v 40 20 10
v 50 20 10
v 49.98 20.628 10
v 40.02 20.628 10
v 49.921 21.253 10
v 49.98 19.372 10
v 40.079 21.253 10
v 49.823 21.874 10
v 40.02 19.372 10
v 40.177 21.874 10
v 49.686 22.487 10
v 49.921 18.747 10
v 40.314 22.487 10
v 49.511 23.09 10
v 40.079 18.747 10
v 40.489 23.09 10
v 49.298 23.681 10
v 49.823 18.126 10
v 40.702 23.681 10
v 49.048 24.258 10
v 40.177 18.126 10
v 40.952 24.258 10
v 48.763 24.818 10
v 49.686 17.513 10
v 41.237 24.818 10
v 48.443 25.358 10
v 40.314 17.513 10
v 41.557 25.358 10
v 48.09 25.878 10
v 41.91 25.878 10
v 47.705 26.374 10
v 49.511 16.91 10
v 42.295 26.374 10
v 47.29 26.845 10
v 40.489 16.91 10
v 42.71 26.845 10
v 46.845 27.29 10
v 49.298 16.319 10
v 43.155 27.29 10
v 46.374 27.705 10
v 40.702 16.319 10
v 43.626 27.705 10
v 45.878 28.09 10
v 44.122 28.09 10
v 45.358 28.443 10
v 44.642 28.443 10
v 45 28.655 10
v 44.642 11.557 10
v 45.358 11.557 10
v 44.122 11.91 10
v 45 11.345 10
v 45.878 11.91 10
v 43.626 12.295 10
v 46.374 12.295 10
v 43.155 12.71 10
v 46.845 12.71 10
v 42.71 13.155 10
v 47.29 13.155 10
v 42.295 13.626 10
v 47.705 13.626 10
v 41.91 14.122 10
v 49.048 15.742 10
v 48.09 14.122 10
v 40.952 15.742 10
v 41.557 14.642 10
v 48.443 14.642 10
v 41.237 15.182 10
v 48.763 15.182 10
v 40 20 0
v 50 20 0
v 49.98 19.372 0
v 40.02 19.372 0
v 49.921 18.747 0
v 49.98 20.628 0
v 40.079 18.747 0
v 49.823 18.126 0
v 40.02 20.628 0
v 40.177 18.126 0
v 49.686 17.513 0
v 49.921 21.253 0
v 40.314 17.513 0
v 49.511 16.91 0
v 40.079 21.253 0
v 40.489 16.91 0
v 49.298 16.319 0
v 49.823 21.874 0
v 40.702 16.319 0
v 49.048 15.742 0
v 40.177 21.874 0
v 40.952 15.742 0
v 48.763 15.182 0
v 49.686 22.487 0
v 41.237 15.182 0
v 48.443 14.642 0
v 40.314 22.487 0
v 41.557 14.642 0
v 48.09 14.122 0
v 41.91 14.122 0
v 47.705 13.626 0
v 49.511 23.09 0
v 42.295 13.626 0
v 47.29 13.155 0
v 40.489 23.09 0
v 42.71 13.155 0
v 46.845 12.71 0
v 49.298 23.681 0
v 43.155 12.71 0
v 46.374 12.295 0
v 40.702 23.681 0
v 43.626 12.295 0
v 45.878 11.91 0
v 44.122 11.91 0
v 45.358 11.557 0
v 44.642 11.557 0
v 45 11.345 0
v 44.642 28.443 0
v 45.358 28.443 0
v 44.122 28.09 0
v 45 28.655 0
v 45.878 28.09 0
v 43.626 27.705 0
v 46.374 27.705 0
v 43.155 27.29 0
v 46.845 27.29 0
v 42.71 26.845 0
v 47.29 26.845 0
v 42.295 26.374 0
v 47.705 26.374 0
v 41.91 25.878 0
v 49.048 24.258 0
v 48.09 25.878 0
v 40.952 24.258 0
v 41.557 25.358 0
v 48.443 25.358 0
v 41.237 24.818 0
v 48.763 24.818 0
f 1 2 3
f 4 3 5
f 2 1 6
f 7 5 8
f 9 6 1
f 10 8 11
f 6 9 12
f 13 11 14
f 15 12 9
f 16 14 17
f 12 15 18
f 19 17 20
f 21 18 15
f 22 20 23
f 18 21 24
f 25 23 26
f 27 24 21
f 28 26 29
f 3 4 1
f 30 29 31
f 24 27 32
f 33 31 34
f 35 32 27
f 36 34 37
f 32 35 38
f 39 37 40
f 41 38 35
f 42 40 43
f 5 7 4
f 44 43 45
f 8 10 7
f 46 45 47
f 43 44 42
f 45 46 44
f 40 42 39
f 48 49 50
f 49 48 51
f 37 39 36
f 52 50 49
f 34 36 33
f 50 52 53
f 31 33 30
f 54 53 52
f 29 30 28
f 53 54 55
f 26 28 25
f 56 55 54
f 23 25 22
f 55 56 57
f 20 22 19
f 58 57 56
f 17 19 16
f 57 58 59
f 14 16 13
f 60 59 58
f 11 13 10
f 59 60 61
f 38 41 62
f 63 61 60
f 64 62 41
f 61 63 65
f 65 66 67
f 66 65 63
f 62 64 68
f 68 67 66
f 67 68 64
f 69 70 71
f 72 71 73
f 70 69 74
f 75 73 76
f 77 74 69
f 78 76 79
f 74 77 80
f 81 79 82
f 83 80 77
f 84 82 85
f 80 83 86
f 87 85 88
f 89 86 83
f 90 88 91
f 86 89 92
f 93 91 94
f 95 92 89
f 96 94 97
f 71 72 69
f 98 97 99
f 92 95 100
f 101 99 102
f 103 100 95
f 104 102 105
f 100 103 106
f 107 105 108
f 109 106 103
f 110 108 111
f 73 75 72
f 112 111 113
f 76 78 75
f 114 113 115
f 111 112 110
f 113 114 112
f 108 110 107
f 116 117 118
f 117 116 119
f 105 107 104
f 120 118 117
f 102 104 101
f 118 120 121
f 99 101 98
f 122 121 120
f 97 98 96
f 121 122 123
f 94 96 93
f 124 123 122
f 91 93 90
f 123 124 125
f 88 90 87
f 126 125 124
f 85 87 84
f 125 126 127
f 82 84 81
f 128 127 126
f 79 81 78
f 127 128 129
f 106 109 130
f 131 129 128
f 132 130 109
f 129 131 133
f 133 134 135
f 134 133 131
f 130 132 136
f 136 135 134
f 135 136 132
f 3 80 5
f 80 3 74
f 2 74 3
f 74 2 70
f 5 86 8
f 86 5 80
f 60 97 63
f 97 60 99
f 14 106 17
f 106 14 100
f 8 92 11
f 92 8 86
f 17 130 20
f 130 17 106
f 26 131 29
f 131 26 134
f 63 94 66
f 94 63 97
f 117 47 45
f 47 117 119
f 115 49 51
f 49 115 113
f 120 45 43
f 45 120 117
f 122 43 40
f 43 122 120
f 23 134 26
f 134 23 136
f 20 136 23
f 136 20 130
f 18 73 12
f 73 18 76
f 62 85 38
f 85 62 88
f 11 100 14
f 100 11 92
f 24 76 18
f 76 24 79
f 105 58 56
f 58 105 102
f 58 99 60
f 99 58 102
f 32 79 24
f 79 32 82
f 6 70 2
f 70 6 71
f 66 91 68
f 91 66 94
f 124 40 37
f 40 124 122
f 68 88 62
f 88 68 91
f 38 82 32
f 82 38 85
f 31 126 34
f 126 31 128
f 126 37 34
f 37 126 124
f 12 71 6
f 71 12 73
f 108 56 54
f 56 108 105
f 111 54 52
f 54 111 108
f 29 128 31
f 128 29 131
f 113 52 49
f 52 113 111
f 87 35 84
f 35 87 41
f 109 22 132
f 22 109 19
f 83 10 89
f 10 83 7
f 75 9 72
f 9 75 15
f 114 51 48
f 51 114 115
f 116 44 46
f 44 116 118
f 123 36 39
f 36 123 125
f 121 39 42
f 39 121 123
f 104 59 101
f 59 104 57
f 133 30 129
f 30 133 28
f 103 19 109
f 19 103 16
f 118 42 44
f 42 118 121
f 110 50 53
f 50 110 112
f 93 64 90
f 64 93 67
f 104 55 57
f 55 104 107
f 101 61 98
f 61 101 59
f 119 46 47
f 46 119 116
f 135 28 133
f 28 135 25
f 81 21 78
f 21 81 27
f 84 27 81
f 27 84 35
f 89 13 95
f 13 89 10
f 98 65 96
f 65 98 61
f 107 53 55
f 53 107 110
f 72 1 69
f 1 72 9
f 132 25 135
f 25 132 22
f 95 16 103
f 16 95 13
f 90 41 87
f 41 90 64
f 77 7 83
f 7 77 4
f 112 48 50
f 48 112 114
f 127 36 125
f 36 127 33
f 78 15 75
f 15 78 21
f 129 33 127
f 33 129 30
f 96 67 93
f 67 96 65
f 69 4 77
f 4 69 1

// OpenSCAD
$fn = 100;

intersection() {
    cube ([80, 40, 10]);
    translate([40, 20, -20])
    cylinder(r=10, h=50);   
    translate([50, 20, -20])
    cylinder(r=10, h=50);     
}
